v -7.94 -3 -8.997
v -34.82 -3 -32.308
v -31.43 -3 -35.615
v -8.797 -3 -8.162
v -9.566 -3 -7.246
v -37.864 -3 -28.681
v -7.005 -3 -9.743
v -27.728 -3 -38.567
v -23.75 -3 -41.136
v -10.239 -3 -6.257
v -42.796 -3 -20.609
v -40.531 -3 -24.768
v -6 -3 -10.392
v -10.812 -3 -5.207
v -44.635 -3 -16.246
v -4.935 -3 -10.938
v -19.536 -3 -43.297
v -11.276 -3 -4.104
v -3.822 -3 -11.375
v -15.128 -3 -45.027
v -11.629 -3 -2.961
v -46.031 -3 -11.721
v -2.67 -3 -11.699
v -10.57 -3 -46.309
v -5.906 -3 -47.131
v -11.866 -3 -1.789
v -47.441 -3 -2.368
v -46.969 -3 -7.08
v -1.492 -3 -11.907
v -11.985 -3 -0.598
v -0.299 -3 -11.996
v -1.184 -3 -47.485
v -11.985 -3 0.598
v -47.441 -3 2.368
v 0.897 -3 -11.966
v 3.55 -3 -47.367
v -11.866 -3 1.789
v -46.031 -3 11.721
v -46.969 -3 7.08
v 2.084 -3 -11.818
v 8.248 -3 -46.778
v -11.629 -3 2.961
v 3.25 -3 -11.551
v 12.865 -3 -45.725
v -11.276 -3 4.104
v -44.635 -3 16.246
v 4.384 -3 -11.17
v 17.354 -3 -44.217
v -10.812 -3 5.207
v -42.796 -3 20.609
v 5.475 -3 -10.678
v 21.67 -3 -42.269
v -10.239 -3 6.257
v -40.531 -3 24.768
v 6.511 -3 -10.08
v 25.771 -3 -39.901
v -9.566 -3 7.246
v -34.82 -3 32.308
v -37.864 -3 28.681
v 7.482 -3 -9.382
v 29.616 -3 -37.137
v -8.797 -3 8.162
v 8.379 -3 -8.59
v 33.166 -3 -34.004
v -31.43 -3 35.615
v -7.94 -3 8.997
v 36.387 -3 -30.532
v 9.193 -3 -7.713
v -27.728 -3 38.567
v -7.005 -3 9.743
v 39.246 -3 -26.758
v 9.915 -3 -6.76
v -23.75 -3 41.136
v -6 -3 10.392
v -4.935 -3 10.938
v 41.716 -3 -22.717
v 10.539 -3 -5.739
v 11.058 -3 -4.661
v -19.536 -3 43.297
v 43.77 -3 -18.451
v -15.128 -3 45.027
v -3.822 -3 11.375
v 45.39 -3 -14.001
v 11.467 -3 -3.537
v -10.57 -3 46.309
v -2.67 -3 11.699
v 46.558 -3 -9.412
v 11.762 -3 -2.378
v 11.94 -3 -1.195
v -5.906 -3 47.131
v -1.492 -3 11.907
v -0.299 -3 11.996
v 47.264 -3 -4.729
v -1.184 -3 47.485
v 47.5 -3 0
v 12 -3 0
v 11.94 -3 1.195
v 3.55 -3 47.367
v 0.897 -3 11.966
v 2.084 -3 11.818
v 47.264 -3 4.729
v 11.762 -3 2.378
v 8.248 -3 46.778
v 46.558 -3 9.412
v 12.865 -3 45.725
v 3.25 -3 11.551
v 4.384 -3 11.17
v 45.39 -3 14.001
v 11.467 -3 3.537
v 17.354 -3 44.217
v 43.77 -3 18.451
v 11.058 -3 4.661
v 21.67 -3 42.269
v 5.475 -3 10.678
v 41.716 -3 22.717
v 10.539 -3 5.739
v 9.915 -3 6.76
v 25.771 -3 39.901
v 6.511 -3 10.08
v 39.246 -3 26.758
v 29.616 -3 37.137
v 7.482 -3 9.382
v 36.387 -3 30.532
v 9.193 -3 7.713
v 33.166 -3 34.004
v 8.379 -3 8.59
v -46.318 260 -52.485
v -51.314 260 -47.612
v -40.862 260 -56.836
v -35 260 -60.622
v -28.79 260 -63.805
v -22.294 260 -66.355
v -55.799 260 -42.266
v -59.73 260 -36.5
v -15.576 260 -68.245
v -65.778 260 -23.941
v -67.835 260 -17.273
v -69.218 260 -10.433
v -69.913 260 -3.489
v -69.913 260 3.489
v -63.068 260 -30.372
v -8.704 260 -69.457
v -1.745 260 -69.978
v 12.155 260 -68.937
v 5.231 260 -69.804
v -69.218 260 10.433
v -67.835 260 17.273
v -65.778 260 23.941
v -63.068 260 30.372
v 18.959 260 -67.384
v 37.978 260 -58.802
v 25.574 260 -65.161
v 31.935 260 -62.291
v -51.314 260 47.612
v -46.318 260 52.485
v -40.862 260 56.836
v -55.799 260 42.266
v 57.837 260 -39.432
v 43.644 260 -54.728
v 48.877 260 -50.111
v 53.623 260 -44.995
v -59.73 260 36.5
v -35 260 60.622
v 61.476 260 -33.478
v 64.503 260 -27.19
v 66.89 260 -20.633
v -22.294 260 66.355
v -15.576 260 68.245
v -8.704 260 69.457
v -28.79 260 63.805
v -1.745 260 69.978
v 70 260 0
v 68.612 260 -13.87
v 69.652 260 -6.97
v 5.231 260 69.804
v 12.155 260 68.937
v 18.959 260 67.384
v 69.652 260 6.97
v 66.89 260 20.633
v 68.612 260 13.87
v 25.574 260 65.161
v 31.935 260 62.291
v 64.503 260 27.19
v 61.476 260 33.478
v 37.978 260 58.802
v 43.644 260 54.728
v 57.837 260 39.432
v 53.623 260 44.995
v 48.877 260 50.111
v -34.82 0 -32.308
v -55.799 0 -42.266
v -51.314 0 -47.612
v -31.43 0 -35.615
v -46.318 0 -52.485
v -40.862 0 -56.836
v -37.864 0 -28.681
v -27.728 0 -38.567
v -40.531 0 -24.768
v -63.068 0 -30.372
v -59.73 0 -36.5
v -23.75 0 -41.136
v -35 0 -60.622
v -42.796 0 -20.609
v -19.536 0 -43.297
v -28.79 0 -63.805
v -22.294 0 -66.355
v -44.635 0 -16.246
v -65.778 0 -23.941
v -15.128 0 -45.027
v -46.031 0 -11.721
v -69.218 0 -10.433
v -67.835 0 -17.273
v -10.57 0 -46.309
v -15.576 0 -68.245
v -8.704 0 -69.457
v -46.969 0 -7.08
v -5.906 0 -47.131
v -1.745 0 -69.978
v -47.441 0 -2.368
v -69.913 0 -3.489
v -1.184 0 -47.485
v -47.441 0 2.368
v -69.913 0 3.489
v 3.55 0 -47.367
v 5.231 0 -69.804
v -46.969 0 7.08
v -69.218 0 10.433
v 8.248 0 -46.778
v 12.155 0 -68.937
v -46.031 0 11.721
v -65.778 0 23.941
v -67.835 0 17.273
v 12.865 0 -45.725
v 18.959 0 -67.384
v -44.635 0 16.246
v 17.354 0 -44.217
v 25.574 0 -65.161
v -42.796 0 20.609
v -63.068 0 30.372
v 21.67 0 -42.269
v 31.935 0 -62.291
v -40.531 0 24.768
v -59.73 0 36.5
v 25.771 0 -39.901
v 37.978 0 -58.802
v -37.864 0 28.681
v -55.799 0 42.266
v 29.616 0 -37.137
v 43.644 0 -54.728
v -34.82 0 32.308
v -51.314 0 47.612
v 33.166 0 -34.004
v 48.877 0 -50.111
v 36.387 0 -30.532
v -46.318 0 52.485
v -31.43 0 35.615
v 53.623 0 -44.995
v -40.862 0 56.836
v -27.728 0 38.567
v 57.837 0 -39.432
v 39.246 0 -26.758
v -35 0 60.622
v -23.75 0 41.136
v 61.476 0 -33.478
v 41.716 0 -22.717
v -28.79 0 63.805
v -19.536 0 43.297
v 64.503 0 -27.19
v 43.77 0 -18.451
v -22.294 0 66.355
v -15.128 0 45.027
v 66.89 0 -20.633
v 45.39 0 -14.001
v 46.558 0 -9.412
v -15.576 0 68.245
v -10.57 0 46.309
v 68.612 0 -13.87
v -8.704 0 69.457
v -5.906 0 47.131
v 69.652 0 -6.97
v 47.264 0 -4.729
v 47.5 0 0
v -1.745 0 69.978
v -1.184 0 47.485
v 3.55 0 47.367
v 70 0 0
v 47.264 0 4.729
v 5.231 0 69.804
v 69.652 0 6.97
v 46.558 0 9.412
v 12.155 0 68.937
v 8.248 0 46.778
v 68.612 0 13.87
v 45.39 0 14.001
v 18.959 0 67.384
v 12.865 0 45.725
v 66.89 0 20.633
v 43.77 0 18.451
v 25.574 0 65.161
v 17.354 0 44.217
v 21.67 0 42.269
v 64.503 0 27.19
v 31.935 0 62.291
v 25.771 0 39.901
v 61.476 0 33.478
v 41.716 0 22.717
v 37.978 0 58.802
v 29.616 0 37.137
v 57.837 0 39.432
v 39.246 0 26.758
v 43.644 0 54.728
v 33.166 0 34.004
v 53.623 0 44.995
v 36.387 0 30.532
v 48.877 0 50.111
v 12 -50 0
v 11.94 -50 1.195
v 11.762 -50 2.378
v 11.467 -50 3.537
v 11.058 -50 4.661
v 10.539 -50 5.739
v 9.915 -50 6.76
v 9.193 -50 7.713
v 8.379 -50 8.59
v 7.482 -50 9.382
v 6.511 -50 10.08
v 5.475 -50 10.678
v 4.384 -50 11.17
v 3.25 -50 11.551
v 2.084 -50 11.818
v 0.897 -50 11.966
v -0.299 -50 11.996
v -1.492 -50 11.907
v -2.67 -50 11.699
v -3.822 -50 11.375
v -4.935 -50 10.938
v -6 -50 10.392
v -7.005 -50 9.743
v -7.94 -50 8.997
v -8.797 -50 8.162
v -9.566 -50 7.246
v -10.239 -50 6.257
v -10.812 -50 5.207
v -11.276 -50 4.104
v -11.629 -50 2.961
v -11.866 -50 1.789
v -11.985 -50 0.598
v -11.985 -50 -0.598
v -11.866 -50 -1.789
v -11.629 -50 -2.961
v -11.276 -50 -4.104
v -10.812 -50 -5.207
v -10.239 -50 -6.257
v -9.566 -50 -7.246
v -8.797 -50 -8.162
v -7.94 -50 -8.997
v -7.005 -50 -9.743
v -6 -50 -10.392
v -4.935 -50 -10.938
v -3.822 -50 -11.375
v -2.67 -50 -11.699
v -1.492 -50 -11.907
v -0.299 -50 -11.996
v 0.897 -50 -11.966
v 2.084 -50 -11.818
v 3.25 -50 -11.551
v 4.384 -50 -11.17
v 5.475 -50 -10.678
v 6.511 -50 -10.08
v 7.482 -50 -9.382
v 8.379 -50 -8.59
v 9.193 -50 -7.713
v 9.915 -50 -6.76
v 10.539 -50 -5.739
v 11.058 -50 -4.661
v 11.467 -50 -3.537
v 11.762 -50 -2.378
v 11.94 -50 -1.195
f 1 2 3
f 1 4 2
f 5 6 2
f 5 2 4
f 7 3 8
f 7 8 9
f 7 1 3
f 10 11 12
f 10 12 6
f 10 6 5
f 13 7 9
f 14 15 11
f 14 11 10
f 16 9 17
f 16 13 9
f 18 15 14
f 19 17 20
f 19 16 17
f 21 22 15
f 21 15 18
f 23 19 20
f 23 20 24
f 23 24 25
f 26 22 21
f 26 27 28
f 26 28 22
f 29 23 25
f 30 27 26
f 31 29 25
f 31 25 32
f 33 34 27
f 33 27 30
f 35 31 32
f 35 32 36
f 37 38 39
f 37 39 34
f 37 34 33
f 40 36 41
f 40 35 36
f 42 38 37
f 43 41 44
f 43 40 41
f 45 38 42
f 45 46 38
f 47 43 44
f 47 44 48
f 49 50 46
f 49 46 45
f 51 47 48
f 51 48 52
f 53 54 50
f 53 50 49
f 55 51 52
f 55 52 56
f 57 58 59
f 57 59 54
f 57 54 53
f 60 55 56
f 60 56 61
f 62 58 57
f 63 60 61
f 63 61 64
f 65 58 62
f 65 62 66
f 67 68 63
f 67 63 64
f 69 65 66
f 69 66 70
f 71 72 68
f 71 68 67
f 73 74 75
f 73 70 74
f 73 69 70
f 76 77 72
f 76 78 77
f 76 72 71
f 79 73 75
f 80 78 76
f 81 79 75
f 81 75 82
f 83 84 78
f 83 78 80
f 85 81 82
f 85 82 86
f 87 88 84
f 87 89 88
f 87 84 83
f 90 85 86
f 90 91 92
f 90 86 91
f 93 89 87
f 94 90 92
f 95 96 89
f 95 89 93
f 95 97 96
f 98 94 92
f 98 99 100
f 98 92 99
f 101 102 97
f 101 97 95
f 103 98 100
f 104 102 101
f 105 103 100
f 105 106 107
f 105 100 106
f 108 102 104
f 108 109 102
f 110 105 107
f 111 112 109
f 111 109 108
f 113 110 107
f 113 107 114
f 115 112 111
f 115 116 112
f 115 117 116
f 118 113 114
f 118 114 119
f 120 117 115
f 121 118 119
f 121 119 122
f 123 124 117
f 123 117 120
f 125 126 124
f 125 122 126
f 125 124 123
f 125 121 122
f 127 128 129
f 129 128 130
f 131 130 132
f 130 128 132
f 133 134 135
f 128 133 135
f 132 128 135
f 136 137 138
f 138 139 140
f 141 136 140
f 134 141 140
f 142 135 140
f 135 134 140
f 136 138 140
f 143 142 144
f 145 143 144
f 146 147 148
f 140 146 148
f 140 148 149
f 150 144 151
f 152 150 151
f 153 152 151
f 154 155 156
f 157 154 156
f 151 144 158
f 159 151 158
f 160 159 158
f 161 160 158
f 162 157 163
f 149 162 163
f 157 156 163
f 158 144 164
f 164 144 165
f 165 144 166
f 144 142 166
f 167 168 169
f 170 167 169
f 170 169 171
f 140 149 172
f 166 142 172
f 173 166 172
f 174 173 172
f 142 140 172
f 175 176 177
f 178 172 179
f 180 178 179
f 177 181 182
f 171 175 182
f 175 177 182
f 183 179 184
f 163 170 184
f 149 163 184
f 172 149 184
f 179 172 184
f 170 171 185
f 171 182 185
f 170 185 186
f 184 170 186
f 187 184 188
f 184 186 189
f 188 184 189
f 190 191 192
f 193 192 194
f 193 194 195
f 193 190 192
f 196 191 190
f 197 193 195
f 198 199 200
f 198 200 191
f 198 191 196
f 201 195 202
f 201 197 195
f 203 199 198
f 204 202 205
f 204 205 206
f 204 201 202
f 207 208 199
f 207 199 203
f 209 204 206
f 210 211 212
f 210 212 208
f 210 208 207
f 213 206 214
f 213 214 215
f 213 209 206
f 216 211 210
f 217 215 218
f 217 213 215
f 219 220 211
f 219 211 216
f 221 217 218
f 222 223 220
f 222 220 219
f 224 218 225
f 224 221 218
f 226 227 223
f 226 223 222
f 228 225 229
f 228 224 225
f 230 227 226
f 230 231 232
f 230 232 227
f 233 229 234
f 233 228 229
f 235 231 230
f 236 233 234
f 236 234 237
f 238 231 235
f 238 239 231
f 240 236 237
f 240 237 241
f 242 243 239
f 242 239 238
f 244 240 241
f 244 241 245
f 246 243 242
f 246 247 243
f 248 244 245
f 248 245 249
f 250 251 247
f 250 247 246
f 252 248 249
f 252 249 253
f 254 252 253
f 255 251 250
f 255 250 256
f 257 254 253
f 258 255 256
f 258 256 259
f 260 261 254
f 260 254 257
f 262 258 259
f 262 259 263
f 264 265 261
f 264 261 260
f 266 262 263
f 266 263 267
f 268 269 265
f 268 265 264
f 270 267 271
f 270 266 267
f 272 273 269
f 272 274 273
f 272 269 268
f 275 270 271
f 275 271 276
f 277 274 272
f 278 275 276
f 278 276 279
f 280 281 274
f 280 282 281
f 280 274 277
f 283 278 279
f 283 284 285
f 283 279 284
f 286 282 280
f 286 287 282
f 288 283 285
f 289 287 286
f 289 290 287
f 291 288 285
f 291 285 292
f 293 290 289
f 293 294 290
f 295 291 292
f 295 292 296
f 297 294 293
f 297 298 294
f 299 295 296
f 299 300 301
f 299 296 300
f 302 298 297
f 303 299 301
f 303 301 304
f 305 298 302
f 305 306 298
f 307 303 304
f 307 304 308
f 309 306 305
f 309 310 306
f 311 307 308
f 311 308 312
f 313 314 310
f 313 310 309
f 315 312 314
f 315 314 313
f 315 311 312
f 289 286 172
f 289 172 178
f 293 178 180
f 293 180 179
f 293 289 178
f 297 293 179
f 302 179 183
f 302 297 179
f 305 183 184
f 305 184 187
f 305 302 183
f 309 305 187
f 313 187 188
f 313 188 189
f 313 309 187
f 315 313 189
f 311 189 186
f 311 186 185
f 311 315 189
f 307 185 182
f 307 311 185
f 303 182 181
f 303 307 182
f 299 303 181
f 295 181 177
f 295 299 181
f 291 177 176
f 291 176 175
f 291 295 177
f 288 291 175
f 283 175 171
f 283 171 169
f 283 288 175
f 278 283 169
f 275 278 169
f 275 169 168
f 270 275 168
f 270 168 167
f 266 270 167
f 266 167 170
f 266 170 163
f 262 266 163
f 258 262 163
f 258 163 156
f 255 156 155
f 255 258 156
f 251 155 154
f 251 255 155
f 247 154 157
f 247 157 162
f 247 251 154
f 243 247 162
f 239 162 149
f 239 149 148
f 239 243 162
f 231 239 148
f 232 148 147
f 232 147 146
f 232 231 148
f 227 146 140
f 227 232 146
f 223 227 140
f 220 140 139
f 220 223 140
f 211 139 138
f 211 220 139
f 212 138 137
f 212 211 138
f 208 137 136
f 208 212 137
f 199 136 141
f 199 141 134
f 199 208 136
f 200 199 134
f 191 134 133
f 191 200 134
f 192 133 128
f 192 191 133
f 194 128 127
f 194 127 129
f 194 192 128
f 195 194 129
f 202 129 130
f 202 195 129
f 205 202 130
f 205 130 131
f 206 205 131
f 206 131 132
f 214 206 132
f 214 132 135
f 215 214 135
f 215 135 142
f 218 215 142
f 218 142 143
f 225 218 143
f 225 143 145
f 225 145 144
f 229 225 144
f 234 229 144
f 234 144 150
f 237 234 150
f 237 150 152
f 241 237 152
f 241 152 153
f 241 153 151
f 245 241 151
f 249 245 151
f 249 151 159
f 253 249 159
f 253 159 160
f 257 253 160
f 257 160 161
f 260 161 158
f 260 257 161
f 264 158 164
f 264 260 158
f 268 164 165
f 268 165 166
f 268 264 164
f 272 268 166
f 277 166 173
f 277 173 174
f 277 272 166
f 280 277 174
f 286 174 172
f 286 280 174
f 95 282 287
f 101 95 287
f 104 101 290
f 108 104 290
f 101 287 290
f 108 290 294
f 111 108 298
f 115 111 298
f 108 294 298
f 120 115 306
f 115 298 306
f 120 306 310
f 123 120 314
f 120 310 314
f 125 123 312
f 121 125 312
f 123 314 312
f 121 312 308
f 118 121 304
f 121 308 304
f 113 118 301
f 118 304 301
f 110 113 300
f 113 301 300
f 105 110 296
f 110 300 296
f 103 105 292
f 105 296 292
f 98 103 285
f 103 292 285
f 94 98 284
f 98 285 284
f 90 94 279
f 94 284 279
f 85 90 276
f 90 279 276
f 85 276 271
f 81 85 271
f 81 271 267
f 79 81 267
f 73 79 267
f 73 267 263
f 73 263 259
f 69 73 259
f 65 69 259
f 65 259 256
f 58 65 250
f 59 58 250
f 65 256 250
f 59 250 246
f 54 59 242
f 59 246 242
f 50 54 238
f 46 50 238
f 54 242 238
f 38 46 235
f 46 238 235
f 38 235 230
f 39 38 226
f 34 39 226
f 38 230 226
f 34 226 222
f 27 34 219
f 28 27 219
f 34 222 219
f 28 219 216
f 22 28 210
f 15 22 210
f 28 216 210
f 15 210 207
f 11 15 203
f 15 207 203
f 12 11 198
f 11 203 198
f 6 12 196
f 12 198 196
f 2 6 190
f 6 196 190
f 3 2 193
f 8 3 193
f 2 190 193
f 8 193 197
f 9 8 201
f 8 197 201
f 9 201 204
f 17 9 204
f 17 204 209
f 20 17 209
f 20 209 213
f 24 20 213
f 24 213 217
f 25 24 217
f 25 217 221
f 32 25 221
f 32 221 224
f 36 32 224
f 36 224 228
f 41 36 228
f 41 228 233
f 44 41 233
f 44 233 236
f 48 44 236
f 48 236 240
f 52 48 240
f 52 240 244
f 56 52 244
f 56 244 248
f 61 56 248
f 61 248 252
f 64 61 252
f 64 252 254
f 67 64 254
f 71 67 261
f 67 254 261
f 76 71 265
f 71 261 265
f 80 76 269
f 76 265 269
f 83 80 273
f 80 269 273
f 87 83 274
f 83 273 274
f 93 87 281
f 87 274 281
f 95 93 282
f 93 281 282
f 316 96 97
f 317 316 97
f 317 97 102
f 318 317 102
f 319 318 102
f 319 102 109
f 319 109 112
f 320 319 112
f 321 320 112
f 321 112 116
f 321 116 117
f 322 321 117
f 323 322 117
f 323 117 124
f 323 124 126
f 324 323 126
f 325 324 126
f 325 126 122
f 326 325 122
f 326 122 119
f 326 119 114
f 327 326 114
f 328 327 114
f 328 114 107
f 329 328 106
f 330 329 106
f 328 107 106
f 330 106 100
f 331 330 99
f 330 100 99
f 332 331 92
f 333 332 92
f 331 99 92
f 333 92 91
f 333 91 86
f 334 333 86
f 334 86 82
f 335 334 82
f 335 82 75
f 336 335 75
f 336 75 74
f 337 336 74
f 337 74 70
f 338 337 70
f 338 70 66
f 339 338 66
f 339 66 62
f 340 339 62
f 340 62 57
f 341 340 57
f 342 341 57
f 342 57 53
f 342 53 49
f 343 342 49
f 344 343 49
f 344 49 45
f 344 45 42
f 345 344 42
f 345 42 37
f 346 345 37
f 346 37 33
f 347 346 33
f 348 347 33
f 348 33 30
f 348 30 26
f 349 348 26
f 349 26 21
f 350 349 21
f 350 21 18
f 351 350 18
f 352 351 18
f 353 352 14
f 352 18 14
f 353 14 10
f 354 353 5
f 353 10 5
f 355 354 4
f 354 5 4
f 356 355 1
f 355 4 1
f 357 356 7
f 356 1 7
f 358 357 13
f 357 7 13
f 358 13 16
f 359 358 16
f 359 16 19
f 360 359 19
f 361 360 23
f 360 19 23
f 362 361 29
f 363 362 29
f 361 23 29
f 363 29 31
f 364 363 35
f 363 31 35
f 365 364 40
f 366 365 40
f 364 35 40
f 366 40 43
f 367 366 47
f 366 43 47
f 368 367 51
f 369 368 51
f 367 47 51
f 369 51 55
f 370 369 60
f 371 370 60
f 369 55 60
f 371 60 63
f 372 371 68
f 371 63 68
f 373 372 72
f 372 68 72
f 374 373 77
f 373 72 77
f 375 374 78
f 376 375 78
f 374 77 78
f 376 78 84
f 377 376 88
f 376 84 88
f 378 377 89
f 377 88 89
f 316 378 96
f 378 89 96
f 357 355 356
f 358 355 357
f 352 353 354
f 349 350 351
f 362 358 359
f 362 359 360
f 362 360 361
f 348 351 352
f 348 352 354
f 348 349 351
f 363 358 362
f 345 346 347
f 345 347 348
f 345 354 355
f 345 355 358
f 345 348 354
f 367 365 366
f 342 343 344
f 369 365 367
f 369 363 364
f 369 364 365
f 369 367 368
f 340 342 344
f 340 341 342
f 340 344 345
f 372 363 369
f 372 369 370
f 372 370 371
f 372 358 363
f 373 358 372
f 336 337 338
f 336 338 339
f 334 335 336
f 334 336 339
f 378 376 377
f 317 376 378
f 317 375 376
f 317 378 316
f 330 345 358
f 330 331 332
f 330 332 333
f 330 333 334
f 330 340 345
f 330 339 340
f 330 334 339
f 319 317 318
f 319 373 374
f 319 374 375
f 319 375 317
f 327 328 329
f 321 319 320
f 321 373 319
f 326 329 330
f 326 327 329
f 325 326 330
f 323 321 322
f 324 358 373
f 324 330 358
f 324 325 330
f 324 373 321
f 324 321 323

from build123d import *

# Parameters (mm, degrees)
F0_R     = 12
F1_DEPTH = 50
F0_R_2   = 47.5
F2_DEPTH = 3
F0_R_3   = 70
F3_DEPTH = 260


with BuildPart() as f1:
    # F0 (on Front) → F1 (new body)
    with BuildSketch(Plane.XZ):
        Circle(F0_R)
    extrude(amount=F1_DEPTH)

    # F0 (on Front) → F2 (join)
    with BuildSketch(Plane.XZ):
        Circle(F0_R_2)
        Circle(F0_R, mode=Mode.SUBTRACT)
    extrude(amount=F2_DEPTH)

    # F0 (on Front) → F3 (join)
    with BuildSketch(Plane.XZ):
        Circle(F0_R_3)
        Circle(F0_R_2, mode=Mode.SUBTRACT)
        Circle(F0_R_2)
        Circle(F0_R, mode=Mode.SUBTRACT)
        Circle(F0_R)
    extrude(amount=-F3_DEPTH)


solid = f1.part
